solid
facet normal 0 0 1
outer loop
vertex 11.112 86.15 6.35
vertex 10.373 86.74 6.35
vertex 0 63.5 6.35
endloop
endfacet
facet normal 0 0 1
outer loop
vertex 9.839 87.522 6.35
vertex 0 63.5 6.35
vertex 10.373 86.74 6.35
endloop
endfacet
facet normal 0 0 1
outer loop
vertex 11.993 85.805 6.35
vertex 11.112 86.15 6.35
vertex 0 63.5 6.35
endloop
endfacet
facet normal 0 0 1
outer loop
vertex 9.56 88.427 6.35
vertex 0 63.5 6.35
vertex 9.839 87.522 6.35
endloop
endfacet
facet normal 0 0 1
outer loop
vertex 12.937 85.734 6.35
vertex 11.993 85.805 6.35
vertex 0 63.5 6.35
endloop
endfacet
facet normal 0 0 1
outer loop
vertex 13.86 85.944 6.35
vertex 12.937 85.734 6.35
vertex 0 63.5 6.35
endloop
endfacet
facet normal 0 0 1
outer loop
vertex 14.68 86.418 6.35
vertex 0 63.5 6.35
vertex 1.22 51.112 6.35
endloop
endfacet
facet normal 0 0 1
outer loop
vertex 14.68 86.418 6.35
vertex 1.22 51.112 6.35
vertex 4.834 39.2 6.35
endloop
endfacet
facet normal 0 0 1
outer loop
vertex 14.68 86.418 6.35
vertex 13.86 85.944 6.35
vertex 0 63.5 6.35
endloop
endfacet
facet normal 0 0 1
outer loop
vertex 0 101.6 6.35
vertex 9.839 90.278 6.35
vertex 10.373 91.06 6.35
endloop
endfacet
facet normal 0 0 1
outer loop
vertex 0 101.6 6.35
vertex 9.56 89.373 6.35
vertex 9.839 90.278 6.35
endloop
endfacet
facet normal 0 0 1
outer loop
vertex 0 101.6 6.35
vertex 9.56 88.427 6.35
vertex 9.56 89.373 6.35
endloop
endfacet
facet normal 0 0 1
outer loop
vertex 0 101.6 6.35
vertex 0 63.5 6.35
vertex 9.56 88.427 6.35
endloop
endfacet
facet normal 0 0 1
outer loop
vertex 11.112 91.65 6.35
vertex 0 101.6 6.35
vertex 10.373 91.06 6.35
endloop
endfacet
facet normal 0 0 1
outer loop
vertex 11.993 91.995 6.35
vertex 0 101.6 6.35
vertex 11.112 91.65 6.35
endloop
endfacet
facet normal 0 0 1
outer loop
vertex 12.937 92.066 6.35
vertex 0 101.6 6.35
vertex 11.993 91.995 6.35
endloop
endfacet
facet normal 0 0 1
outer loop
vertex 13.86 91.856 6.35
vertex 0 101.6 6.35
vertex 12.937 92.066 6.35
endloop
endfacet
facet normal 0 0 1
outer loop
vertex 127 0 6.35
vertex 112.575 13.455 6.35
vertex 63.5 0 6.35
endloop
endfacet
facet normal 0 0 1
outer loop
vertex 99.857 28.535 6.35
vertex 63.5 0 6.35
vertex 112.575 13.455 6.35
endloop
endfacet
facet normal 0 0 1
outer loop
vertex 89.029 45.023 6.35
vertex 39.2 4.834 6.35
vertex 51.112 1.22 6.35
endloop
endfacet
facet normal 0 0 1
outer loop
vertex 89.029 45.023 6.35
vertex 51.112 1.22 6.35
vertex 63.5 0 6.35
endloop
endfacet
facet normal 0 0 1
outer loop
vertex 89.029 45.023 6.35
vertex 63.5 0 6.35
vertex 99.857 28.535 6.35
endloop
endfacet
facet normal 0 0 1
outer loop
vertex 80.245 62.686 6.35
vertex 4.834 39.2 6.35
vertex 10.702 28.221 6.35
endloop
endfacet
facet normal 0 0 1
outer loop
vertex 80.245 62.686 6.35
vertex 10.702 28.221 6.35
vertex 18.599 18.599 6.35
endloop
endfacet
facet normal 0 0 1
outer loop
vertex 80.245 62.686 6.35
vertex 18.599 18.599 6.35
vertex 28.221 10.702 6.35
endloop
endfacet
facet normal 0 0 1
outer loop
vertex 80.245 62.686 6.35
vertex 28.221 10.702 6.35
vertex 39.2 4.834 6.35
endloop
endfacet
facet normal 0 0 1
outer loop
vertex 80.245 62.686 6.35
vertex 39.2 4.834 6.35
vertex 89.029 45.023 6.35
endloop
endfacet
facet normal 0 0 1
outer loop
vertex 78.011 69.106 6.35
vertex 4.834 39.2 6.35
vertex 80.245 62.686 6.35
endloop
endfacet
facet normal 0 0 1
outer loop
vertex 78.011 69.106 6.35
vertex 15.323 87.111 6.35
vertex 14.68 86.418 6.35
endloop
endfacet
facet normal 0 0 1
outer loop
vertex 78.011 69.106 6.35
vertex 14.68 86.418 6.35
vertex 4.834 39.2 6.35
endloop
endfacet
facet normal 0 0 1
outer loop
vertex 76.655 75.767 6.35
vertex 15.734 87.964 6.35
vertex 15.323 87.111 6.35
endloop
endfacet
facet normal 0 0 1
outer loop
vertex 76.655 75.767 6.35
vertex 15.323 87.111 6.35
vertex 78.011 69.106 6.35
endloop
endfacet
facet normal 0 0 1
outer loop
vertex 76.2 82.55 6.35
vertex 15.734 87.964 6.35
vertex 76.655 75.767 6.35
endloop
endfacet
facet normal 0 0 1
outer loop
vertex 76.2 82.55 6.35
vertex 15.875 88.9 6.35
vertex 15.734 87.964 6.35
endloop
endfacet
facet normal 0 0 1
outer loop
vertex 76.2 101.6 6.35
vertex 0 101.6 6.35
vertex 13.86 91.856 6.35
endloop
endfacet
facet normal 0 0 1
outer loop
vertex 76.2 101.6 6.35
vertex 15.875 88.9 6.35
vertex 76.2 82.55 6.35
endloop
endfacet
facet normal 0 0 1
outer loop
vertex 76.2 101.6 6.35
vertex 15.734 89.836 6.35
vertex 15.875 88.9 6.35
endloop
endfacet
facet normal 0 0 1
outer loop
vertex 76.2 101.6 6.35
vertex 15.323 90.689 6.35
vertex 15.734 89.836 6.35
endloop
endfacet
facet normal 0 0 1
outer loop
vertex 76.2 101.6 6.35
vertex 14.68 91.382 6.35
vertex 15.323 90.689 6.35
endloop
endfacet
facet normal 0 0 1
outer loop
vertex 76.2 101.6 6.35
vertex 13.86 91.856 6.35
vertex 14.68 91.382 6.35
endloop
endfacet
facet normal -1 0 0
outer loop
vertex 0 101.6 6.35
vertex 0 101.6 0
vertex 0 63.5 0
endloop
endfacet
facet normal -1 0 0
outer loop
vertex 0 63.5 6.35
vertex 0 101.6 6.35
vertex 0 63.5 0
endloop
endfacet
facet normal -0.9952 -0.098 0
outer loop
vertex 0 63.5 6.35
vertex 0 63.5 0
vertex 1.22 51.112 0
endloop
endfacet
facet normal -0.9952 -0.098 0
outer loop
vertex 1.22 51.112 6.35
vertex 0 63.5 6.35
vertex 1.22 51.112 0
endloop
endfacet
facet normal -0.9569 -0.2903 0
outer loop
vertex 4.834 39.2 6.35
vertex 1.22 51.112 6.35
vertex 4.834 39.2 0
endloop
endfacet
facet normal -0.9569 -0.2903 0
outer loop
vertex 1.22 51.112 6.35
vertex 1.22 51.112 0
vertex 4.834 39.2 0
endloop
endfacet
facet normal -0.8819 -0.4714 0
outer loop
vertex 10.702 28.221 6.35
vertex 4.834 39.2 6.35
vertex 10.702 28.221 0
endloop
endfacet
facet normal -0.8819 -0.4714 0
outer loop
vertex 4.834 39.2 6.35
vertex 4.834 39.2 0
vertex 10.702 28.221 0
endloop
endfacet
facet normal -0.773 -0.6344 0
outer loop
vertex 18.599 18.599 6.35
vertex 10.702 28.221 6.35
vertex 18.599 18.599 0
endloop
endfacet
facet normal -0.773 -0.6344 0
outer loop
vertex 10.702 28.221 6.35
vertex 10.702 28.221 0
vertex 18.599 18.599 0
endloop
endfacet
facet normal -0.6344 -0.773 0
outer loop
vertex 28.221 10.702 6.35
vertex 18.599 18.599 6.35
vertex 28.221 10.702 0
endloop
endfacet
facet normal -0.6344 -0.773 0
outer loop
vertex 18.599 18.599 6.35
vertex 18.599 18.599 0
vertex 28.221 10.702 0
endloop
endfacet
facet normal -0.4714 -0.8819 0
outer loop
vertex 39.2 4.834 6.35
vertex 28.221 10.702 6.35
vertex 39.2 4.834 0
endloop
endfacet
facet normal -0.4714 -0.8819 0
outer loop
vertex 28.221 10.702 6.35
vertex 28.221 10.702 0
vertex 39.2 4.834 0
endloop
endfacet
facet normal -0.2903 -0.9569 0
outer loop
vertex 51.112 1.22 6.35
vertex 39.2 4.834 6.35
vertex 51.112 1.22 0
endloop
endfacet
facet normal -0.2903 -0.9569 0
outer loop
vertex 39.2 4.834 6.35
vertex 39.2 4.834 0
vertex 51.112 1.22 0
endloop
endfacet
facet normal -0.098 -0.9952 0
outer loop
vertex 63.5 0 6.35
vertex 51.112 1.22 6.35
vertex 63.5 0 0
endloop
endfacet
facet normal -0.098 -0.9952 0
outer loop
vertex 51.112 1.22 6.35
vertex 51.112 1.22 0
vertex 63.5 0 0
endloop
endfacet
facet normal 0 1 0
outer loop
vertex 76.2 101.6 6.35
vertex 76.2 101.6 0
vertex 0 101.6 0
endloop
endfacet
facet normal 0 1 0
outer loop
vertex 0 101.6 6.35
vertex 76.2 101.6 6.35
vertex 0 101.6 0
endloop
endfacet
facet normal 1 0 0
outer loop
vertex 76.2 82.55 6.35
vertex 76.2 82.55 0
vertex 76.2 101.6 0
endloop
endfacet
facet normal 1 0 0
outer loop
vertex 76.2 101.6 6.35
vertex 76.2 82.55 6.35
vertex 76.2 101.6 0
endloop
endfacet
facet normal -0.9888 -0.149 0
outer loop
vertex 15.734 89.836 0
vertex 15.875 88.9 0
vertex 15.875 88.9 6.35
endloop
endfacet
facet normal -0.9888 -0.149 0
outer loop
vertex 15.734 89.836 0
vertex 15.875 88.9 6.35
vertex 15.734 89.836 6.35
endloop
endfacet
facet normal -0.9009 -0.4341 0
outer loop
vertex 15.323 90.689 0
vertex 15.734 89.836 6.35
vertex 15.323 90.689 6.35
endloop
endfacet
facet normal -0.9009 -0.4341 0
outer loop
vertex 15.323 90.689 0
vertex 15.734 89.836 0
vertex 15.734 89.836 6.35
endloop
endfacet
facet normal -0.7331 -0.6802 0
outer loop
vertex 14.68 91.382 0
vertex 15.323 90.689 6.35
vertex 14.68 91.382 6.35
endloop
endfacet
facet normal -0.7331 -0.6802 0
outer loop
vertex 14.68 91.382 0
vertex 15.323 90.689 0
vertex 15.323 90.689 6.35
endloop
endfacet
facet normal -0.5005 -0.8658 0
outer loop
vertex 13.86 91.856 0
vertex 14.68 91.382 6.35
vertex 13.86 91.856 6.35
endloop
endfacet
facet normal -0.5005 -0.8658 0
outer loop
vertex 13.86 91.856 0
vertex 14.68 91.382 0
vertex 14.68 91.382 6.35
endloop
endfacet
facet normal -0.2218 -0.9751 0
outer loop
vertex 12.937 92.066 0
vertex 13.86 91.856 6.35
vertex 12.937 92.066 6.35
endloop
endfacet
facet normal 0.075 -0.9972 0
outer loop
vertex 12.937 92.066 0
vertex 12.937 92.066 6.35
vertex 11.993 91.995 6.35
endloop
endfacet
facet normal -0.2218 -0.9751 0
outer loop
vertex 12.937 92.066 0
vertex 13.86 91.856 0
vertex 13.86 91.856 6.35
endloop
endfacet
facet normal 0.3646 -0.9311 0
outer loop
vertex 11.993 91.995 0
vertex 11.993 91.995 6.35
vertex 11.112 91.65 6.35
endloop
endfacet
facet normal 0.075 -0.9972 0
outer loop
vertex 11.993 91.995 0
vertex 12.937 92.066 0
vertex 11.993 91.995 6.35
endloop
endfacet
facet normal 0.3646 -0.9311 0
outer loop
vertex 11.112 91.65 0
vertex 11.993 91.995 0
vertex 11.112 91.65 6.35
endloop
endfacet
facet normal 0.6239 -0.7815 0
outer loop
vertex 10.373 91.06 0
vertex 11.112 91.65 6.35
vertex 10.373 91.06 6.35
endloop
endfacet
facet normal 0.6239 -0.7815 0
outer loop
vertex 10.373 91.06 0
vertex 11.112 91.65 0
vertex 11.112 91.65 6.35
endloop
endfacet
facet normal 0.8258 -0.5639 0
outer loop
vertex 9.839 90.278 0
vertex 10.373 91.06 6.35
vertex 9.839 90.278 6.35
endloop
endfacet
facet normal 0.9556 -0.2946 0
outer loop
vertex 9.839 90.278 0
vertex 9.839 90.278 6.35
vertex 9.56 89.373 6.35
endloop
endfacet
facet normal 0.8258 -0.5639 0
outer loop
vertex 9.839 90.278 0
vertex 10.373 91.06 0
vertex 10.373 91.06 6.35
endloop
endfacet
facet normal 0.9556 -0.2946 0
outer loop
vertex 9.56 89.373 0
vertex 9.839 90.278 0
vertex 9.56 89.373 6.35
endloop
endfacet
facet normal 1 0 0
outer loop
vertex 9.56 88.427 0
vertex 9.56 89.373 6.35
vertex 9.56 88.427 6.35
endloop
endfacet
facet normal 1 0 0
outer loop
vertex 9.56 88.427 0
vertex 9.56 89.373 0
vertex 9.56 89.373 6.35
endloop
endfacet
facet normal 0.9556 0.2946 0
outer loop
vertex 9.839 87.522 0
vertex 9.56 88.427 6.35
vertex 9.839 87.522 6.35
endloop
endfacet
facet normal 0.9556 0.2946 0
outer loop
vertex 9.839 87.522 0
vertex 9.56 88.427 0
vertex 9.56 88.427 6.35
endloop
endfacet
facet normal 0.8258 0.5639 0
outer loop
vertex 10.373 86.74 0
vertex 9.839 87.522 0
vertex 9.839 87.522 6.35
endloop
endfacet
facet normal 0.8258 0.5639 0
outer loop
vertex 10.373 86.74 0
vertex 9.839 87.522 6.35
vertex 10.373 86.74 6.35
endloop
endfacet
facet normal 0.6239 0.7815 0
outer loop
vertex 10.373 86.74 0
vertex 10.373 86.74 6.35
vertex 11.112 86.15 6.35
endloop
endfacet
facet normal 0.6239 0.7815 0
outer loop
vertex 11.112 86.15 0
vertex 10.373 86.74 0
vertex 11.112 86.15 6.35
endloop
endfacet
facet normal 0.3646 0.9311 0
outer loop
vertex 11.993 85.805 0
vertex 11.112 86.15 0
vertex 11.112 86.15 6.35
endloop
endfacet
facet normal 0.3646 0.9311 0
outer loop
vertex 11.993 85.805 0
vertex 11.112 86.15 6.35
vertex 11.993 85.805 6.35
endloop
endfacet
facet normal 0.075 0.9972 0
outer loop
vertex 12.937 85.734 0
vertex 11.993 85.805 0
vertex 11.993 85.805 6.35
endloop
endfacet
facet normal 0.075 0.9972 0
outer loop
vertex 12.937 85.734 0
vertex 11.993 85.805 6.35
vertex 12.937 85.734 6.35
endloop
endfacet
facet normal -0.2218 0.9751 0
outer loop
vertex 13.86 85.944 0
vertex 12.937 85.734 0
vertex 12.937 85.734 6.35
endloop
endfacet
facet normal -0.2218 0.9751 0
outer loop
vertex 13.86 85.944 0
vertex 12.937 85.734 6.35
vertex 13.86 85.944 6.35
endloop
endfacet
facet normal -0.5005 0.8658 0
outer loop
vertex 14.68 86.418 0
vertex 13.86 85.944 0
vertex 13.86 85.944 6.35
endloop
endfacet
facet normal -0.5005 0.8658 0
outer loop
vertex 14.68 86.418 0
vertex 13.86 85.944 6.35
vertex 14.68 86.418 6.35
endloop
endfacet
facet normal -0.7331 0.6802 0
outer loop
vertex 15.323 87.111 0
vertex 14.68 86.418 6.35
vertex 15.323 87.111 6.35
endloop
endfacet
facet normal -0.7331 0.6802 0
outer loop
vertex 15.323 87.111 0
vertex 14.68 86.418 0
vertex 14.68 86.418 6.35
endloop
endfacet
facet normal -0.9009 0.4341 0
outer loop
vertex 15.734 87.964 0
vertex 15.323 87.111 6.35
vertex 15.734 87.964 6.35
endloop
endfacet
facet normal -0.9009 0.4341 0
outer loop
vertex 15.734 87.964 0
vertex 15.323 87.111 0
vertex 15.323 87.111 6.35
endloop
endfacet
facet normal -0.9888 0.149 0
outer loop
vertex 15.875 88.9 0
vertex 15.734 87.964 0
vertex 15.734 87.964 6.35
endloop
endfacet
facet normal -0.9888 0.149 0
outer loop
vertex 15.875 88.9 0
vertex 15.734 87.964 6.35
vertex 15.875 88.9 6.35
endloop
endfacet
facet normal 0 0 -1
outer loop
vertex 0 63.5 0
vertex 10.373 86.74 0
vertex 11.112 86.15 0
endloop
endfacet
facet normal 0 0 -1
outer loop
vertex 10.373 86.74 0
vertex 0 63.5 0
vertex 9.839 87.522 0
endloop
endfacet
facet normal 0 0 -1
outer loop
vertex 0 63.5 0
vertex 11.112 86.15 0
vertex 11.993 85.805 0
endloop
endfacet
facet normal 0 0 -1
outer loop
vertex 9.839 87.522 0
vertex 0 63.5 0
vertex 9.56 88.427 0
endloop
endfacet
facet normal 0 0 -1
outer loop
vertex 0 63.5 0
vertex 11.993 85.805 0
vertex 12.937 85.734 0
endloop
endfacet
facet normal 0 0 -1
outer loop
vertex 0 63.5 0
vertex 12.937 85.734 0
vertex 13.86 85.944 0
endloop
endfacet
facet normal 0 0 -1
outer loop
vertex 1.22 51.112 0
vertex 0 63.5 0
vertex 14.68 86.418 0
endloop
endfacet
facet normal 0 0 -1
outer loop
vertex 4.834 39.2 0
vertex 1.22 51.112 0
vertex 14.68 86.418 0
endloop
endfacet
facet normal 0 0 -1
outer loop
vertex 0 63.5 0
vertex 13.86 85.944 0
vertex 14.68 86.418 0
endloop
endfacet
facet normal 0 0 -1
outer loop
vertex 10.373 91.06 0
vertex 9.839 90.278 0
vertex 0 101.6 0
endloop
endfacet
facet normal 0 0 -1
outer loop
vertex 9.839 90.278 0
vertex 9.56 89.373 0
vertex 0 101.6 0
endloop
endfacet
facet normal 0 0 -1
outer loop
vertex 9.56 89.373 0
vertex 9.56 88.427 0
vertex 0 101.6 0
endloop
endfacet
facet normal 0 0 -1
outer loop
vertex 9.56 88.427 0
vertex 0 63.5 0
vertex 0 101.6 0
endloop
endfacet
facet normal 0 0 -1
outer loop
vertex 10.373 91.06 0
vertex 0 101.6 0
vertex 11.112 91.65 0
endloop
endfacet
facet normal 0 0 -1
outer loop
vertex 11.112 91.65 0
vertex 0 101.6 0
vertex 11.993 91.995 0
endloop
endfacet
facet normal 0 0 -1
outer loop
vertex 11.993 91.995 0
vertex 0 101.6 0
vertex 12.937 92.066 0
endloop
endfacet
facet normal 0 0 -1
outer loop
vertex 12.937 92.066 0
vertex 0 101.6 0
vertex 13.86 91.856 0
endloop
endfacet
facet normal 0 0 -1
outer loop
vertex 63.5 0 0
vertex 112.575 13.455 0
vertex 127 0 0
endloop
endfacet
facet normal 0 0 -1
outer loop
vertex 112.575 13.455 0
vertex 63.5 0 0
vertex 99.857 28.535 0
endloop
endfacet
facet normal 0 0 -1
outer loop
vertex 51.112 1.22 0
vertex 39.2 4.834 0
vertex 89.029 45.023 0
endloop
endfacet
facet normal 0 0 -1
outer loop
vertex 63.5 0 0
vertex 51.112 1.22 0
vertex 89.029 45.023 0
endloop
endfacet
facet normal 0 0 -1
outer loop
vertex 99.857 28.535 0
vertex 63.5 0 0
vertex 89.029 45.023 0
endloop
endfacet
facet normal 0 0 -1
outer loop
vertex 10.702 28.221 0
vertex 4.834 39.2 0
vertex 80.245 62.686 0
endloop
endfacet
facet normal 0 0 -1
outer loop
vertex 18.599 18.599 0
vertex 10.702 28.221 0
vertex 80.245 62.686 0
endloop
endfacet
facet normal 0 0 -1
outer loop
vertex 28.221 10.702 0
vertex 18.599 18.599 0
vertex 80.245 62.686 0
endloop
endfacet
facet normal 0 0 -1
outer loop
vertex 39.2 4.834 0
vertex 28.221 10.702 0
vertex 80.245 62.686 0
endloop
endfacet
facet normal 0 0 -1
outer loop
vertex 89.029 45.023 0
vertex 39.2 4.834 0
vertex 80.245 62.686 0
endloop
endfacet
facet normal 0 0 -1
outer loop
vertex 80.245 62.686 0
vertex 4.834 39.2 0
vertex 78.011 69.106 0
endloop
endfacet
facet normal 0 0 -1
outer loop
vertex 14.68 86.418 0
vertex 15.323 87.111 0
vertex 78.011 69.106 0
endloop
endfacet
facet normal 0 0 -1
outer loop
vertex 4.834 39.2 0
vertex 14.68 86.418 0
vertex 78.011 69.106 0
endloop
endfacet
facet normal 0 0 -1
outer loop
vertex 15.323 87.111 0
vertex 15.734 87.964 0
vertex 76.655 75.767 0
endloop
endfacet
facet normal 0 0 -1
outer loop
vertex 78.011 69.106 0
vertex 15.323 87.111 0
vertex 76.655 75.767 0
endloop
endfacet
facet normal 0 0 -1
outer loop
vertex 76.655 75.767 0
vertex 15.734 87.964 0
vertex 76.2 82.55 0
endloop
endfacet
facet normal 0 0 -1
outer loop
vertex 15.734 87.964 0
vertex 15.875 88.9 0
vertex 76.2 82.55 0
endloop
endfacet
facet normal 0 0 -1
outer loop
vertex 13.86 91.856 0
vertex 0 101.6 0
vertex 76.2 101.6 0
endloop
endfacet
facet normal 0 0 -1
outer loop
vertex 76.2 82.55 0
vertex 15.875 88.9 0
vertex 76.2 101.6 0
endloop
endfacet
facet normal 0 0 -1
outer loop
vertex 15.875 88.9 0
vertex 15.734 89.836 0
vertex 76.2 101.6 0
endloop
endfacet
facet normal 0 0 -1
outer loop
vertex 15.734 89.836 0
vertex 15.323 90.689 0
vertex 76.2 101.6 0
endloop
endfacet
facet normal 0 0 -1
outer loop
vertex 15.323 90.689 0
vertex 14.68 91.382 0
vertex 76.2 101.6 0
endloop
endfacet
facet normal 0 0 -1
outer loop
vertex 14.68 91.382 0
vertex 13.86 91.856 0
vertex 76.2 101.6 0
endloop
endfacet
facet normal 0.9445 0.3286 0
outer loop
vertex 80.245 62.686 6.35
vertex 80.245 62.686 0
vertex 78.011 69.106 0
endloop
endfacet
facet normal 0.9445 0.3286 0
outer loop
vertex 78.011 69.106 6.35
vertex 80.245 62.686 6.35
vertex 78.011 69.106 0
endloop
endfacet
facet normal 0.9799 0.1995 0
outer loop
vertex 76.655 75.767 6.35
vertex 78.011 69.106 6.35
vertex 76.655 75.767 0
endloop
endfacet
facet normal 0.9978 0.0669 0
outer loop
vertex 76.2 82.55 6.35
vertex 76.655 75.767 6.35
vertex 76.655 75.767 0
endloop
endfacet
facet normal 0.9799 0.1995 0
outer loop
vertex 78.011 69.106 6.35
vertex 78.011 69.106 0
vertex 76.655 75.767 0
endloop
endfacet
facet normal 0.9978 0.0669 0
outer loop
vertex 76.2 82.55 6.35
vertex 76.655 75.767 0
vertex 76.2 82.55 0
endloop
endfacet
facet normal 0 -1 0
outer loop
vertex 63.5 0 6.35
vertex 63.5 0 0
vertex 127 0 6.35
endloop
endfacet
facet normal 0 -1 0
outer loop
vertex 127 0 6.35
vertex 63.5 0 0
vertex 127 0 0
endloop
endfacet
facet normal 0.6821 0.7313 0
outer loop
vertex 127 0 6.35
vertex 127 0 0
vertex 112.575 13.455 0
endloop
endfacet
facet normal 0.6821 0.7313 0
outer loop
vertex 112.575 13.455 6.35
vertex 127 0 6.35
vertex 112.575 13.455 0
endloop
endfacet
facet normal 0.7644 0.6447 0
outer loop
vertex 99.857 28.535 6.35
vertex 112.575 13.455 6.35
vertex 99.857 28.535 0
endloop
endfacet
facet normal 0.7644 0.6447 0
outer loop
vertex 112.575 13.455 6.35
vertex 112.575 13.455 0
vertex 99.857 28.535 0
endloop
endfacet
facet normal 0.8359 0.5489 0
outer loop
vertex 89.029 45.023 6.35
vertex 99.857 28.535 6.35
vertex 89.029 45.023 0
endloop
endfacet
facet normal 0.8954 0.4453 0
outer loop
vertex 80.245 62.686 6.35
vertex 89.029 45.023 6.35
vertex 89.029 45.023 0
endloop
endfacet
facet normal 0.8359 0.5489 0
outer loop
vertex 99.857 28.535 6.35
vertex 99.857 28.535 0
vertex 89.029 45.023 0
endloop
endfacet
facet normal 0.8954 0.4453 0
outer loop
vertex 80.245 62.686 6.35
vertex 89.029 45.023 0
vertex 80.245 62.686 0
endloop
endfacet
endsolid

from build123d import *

# Parameters (mm, degrees)
SKETCH1_R           = 3.175
BOSS_EXTRUDE1_DEPTH = 6.35


with BuildPart() as part:
    # Sketch1 → Boss-Extrude1 (new body)
    with BuildSketch(Plane.XY):
        with BuildLine():
            Line((63.5, 0), (127, 0))
            ThreePointArc((127, 0), (99.857277989, 28.53470612), (80.244706938, 62.685897436))
            ThreePointArc((80.244706938, 62.685897436), (77.221445945, 72.414145018), (76.2, 82.55))
            Line((76.2, 82.55), (76.2, 101.6))
            Line((76.2, 101.6), (0, 101.6))
            Line((0, 101.6), (0, 63.5))
            ThreePointArc((0, 63.5), (18.598719395, 18.598719395), (63.5, 0))
        make_face()
        with Locations((12.7, 88.9)):
            Circle(SKETCH1_R, mode=Mode.SUBTRACT)
    extrude(amount=BOSS_EXTRUDE1_DEPTH)


solid = part.part
